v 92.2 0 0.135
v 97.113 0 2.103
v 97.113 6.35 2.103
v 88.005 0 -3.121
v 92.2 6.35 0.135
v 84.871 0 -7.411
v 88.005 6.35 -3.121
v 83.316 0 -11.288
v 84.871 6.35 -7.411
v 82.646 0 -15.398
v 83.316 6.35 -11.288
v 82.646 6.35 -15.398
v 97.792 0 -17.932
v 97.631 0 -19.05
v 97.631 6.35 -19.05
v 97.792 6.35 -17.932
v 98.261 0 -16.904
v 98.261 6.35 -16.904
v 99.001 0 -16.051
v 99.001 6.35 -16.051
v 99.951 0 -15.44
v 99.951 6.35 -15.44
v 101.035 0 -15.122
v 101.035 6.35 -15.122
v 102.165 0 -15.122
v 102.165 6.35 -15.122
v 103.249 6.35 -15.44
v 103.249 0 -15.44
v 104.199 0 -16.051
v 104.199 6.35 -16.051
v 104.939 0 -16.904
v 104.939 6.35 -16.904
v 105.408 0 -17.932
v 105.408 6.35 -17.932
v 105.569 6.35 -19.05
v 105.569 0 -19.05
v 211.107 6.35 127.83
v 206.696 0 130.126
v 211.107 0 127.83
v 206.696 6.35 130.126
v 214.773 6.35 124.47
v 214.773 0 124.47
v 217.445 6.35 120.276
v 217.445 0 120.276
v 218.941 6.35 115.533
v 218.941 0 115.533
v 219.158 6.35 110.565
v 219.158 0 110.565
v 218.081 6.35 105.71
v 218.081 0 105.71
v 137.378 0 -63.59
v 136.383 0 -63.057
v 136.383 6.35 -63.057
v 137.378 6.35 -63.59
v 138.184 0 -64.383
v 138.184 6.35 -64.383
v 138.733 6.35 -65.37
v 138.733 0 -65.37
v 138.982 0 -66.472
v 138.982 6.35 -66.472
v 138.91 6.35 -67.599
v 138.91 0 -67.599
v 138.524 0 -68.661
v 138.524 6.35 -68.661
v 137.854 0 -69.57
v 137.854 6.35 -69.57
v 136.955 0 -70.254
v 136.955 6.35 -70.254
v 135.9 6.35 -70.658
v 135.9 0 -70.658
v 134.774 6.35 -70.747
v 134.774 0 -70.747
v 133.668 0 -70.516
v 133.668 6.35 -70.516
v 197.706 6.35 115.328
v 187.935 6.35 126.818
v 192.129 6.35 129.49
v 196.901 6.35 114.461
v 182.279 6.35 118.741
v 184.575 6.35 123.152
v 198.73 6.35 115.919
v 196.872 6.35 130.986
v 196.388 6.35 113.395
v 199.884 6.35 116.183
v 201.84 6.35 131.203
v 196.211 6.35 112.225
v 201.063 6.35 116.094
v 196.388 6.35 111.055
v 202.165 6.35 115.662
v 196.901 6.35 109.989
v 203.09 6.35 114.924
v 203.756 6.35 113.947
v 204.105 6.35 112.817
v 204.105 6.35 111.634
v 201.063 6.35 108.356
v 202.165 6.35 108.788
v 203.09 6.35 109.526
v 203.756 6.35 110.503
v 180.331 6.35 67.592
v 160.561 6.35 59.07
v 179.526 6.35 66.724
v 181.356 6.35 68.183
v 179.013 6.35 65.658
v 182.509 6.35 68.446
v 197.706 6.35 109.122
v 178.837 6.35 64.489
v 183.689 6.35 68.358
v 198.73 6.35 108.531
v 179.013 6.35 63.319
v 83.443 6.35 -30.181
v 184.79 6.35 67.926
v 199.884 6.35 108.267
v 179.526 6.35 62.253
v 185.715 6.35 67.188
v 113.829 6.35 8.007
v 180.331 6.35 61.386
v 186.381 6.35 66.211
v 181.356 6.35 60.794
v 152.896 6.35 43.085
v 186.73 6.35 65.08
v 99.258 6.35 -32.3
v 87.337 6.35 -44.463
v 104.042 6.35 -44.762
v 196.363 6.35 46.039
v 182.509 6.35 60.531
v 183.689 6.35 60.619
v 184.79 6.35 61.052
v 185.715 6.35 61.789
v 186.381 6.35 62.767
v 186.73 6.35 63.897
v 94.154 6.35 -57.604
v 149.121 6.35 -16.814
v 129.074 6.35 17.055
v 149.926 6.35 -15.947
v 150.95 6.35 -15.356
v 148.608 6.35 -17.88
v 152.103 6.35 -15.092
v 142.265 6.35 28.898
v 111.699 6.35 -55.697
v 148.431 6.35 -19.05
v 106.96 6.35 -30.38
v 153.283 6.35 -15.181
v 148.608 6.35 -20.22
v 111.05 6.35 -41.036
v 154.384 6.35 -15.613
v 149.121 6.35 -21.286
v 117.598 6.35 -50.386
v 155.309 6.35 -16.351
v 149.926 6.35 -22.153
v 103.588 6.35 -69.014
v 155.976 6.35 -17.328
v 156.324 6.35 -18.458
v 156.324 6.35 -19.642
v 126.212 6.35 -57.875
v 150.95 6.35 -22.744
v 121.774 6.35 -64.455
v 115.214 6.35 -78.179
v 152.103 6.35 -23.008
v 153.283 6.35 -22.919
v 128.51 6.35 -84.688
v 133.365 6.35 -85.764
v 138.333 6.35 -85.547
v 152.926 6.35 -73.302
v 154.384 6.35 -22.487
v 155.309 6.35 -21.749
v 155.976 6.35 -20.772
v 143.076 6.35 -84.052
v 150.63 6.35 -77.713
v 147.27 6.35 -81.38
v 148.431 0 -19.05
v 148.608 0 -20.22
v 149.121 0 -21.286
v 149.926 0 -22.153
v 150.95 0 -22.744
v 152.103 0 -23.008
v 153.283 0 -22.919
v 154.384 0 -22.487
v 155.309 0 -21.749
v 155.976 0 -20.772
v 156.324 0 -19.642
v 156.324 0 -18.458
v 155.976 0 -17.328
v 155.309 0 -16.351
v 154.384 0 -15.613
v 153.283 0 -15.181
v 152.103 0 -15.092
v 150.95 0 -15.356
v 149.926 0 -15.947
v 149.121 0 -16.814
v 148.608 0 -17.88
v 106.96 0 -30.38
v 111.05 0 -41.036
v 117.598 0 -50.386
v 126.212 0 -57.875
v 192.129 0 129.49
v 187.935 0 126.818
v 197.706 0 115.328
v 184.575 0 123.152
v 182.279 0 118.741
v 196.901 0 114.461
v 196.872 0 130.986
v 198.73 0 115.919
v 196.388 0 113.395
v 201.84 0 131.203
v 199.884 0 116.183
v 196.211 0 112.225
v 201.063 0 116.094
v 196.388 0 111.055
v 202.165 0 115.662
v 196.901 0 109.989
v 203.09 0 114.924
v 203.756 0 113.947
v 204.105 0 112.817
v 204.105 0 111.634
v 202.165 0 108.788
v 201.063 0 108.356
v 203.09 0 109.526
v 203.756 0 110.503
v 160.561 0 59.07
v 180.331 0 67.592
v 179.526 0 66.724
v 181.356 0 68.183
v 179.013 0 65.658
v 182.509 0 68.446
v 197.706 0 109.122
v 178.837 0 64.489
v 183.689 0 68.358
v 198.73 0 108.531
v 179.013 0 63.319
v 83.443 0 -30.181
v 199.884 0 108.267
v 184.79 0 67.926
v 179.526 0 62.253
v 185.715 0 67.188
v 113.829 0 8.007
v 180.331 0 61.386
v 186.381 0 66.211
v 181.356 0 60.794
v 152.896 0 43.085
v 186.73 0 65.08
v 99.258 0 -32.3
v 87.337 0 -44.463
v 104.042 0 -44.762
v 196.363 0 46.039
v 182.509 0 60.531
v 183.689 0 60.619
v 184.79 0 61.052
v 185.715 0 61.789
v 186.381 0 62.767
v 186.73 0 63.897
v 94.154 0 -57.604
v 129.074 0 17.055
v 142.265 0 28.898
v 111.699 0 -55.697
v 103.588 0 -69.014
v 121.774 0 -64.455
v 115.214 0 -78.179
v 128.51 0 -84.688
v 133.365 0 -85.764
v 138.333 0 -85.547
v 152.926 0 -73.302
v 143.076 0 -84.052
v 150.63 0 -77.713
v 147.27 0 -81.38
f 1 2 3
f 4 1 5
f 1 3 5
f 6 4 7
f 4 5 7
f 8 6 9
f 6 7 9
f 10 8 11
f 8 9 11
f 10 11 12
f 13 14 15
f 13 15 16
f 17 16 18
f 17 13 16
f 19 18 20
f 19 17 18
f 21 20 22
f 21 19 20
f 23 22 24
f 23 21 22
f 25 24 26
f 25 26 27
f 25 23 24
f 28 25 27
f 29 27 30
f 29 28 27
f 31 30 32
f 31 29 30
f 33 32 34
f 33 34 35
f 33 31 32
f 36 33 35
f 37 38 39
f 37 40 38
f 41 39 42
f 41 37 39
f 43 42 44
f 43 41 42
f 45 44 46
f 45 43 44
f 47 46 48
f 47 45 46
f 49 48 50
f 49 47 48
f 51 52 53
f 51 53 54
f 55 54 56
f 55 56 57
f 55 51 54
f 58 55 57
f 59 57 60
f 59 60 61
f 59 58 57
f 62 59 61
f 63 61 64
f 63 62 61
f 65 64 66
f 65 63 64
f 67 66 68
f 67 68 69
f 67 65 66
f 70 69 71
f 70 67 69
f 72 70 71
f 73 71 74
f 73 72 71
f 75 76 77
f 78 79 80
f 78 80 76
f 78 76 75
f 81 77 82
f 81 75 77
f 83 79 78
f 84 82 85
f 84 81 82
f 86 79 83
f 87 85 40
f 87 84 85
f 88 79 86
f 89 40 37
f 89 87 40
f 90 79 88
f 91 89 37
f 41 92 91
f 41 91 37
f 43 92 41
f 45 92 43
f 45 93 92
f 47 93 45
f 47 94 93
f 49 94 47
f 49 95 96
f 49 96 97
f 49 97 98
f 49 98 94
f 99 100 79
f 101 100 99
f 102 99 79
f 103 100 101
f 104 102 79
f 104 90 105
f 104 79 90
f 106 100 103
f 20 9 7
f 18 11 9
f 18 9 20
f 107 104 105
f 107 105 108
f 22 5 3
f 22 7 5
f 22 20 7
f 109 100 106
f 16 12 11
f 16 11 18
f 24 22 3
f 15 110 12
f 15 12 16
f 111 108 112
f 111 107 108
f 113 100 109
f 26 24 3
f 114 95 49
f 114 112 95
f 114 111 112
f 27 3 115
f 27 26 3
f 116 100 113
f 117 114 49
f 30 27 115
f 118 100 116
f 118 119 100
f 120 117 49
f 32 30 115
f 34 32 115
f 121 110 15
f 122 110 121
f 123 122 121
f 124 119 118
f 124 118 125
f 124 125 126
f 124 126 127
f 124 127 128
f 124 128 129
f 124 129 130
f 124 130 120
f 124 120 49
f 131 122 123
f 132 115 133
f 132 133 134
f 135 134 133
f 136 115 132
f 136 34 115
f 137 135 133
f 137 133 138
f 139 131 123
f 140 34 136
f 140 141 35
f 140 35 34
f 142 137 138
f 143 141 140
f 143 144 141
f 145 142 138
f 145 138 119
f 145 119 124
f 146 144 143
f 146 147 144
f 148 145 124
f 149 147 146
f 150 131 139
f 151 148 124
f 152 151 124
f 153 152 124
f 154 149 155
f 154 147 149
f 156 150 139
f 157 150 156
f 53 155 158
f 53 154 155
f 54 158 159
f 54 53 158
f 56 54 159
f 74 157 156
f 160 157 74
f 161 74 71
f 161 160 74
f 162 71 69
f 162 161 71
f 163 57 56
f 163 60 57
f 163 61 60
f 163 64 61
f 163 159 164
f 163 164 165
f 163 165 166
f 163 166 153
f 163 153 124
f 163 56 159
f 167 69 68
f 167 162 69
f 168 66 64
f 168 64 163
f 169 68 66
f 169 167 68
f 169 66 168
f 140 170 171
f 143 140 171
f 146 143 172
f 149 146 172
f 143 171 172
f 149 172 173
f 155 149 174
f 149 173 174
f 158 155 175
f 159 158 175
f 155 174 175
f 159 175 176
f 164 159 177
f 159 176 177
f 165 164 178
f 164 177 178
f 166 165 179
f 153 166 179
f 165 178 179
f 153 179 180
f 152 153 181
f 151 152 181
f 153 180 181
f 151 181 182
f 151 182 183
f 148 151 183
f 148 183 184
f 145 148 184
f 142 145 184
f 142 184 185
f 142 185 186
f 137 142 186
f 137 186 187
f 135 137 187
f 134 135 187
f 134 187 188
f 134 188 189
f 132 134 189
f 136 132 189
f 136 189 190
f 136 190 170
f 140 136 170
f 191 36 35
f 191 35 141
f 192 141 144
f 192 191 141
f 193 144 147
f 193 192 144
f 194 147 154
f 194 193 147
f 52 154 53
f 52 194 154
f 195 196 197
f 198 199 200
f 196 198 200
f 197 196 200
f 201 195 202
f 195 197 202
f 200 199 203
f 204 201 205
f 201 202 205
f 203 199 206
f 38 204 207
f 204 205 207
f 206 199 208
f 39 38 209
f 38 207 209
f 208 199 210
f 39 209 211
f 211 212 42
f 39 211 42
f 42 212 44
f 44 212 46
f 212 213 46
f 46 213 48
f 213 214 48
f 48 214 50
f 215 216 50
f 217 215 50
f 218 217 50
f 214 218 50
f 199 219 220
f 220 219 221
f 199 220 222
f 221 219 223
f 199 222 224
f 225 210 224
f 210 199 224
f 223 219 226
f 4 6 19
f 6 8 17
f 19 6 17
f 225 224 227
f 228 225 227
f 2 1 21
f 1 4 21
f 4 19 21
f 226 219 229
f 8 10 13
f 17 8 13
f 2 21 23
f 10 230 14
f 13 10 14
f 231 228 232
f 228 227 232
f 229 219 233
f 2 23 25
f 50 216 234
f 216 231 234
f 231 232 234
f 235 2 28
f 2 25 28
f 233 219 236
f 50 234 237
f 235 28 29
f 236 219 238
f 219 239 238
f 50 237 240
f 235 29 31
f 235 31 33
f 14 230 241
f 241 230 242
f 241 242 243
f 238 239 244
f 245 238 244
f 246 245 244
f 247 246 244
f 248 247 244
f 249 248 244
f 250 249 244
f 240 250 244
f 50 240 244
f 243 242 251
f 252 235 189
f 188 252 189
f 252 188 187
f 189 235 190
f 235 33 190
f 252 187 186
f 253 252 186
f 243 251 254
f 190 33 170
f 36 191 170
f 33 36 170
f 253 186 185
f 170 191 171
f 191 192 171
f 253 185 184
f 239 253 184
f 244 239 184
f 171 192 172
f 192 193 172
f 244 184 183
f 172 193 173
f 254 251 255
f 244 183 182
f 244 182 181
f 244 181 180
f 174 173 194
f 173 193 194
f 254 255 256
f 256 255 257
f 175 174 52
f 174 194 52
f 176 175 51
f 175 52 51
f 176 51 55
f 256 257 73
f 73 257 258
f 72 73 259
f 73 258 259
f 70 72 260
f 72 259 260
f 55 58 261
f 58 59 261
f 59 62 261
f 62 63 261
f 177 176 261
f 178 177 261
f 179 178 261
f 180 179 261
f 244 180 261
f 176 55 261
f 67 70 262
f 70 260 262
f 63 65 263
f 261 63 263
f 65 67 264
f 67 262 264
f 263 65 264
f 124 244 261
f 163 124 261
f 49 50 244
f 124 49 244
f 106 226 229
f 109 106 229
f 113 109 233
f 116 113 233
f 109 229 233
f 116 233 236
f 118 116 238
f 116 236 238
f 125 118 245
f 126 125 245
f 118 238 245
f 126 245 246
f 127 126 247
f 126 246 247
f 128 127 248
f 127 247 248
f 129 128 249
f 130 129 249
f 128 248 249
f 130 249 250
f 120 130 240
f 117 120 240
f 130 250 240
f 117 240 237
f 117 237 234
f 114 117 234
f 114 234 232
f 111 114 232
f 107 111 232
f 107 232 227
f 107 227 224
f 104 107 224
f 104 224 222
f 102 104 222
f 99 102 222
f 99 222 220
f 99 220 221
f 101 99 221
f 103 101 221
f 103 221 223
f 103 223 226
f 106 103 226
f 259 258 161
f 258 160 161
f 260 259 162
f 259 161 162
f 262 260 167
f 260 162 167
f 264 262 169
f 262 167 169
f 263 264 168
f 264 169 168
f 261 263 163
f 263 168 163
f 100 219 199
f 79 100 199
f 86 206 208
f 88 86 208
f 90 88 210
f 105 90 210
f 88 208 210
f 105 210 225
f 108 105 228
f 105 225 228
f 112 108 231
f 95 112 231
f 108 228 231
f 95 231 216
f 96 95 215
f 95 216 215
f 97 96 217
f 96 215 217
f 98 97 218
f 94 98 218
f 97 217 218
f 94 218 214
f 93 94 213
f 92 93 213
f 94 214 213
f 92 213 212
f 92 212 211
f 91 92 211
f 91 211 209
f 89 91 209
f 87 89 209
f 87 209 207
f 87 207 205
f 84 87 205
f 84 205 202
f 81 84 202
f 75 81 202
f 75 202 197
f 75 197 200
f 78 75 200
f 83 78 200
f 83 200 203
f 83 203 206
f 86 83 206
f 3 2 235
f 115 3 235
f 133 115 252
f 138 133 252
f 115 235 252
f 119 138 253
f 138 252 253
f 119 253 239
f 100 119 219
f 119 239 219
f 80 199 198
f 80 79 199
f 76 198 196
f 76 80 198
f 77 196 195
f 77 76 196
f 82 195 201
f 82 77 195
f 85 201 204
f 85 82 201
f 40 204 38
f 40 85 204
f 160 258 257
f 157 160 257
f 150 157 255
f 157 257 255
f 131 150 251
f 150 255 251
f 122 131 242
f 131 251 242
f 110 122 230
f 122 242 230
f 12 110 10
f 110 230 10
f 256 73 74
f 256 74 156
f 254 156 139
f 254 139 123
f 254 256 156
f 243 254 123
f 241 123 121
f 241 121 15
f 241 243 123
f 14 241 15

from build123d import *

# Parameters (mm, degrees)
BOSS_EXTRUDE3_DEPTH            = 6.35
F_5_16_0_3125_DIAMETER_HOLE2_D = 7.9375
FILLET2_R                      = 19.05


with BuildPart() as part:
    # Sketch1 → Boss-Extrude3 (new body)
    with BuildSketch(Plane(origin=(0, 0, 0), x_dir=(1, 0, 0), z_dir=(0, 1, 0))):
        with BuildLine():
            Line((160.560790495, -59.070061434), (188.794553327, -136.64168728))
            Line((188.794553327, -136.64168728), (224.596842179, -123.610719819))
            Line((224.596842179, -123.610719819), (196.363079347, -46.039093974))
            Line((196.363079347, -46.039093974), (147.316678264, 88.71478551))
            ThreePointArc((147.316678264, 88.71478551), (95.182229706, 59.114314079), (85.197916699, 0))
            ThreePointArc((85.197916699, 0), (131.323386462, -18.761949266), (160.560790495, -59.070061434))
        make_face()
        with BuildLine():
            ThreePointArc((105.56875, 19.05), (114.038085826, 45.911301485), (136.382769163, 63.056980047))
            ThreePointArc((136.382769163, 63.056980047), (138.754781808, 68.14377758), (133.667984275, 70.515790225))
            ThreePointArc((133.667984275, 70.515790225), (107.536066474, 50.464064448), (97.63125, 19.05))
            ThreePointArc((97.63125, 19.05), (101.6, 15.08125), (105.56875, 19.05))
        make_face(mode=Mode.SUBTRACT)
    extrude(amount=BOSS_EXTRUDE3_DEPTH)

    # 5/16 (0.3125) Diameter Hole2 (through all)
    with Locations(Plane(origin=(0, 6.35, 0), x_dir=(1, 0, 0), z_dir=(0, 1, 0))):
        with Locations((152.4, 19.05), (182.805590742, -64.488673988), (200.180214023, -112.225059124)):
            Hole(F_5_16_0_3125_DIAMETER_HOLE2_D / 2)

    # Fillet2
    fillet2_edges = [part.edges().sort_by_distance(p)[0] for p in [
        (147.316678264, 3.175, -88.71478551),
        (224.596842179, 3.175, 123.610719819),
        (188.794553327, 3.175, 136.64168728),
        (85.197916699, 3.175, 0),
    ]]
    fillet(fillet2_edges, radius=FILLET2_R - 0.0001)  # a hair under: the kernel refuses the full size


solid = part.part
